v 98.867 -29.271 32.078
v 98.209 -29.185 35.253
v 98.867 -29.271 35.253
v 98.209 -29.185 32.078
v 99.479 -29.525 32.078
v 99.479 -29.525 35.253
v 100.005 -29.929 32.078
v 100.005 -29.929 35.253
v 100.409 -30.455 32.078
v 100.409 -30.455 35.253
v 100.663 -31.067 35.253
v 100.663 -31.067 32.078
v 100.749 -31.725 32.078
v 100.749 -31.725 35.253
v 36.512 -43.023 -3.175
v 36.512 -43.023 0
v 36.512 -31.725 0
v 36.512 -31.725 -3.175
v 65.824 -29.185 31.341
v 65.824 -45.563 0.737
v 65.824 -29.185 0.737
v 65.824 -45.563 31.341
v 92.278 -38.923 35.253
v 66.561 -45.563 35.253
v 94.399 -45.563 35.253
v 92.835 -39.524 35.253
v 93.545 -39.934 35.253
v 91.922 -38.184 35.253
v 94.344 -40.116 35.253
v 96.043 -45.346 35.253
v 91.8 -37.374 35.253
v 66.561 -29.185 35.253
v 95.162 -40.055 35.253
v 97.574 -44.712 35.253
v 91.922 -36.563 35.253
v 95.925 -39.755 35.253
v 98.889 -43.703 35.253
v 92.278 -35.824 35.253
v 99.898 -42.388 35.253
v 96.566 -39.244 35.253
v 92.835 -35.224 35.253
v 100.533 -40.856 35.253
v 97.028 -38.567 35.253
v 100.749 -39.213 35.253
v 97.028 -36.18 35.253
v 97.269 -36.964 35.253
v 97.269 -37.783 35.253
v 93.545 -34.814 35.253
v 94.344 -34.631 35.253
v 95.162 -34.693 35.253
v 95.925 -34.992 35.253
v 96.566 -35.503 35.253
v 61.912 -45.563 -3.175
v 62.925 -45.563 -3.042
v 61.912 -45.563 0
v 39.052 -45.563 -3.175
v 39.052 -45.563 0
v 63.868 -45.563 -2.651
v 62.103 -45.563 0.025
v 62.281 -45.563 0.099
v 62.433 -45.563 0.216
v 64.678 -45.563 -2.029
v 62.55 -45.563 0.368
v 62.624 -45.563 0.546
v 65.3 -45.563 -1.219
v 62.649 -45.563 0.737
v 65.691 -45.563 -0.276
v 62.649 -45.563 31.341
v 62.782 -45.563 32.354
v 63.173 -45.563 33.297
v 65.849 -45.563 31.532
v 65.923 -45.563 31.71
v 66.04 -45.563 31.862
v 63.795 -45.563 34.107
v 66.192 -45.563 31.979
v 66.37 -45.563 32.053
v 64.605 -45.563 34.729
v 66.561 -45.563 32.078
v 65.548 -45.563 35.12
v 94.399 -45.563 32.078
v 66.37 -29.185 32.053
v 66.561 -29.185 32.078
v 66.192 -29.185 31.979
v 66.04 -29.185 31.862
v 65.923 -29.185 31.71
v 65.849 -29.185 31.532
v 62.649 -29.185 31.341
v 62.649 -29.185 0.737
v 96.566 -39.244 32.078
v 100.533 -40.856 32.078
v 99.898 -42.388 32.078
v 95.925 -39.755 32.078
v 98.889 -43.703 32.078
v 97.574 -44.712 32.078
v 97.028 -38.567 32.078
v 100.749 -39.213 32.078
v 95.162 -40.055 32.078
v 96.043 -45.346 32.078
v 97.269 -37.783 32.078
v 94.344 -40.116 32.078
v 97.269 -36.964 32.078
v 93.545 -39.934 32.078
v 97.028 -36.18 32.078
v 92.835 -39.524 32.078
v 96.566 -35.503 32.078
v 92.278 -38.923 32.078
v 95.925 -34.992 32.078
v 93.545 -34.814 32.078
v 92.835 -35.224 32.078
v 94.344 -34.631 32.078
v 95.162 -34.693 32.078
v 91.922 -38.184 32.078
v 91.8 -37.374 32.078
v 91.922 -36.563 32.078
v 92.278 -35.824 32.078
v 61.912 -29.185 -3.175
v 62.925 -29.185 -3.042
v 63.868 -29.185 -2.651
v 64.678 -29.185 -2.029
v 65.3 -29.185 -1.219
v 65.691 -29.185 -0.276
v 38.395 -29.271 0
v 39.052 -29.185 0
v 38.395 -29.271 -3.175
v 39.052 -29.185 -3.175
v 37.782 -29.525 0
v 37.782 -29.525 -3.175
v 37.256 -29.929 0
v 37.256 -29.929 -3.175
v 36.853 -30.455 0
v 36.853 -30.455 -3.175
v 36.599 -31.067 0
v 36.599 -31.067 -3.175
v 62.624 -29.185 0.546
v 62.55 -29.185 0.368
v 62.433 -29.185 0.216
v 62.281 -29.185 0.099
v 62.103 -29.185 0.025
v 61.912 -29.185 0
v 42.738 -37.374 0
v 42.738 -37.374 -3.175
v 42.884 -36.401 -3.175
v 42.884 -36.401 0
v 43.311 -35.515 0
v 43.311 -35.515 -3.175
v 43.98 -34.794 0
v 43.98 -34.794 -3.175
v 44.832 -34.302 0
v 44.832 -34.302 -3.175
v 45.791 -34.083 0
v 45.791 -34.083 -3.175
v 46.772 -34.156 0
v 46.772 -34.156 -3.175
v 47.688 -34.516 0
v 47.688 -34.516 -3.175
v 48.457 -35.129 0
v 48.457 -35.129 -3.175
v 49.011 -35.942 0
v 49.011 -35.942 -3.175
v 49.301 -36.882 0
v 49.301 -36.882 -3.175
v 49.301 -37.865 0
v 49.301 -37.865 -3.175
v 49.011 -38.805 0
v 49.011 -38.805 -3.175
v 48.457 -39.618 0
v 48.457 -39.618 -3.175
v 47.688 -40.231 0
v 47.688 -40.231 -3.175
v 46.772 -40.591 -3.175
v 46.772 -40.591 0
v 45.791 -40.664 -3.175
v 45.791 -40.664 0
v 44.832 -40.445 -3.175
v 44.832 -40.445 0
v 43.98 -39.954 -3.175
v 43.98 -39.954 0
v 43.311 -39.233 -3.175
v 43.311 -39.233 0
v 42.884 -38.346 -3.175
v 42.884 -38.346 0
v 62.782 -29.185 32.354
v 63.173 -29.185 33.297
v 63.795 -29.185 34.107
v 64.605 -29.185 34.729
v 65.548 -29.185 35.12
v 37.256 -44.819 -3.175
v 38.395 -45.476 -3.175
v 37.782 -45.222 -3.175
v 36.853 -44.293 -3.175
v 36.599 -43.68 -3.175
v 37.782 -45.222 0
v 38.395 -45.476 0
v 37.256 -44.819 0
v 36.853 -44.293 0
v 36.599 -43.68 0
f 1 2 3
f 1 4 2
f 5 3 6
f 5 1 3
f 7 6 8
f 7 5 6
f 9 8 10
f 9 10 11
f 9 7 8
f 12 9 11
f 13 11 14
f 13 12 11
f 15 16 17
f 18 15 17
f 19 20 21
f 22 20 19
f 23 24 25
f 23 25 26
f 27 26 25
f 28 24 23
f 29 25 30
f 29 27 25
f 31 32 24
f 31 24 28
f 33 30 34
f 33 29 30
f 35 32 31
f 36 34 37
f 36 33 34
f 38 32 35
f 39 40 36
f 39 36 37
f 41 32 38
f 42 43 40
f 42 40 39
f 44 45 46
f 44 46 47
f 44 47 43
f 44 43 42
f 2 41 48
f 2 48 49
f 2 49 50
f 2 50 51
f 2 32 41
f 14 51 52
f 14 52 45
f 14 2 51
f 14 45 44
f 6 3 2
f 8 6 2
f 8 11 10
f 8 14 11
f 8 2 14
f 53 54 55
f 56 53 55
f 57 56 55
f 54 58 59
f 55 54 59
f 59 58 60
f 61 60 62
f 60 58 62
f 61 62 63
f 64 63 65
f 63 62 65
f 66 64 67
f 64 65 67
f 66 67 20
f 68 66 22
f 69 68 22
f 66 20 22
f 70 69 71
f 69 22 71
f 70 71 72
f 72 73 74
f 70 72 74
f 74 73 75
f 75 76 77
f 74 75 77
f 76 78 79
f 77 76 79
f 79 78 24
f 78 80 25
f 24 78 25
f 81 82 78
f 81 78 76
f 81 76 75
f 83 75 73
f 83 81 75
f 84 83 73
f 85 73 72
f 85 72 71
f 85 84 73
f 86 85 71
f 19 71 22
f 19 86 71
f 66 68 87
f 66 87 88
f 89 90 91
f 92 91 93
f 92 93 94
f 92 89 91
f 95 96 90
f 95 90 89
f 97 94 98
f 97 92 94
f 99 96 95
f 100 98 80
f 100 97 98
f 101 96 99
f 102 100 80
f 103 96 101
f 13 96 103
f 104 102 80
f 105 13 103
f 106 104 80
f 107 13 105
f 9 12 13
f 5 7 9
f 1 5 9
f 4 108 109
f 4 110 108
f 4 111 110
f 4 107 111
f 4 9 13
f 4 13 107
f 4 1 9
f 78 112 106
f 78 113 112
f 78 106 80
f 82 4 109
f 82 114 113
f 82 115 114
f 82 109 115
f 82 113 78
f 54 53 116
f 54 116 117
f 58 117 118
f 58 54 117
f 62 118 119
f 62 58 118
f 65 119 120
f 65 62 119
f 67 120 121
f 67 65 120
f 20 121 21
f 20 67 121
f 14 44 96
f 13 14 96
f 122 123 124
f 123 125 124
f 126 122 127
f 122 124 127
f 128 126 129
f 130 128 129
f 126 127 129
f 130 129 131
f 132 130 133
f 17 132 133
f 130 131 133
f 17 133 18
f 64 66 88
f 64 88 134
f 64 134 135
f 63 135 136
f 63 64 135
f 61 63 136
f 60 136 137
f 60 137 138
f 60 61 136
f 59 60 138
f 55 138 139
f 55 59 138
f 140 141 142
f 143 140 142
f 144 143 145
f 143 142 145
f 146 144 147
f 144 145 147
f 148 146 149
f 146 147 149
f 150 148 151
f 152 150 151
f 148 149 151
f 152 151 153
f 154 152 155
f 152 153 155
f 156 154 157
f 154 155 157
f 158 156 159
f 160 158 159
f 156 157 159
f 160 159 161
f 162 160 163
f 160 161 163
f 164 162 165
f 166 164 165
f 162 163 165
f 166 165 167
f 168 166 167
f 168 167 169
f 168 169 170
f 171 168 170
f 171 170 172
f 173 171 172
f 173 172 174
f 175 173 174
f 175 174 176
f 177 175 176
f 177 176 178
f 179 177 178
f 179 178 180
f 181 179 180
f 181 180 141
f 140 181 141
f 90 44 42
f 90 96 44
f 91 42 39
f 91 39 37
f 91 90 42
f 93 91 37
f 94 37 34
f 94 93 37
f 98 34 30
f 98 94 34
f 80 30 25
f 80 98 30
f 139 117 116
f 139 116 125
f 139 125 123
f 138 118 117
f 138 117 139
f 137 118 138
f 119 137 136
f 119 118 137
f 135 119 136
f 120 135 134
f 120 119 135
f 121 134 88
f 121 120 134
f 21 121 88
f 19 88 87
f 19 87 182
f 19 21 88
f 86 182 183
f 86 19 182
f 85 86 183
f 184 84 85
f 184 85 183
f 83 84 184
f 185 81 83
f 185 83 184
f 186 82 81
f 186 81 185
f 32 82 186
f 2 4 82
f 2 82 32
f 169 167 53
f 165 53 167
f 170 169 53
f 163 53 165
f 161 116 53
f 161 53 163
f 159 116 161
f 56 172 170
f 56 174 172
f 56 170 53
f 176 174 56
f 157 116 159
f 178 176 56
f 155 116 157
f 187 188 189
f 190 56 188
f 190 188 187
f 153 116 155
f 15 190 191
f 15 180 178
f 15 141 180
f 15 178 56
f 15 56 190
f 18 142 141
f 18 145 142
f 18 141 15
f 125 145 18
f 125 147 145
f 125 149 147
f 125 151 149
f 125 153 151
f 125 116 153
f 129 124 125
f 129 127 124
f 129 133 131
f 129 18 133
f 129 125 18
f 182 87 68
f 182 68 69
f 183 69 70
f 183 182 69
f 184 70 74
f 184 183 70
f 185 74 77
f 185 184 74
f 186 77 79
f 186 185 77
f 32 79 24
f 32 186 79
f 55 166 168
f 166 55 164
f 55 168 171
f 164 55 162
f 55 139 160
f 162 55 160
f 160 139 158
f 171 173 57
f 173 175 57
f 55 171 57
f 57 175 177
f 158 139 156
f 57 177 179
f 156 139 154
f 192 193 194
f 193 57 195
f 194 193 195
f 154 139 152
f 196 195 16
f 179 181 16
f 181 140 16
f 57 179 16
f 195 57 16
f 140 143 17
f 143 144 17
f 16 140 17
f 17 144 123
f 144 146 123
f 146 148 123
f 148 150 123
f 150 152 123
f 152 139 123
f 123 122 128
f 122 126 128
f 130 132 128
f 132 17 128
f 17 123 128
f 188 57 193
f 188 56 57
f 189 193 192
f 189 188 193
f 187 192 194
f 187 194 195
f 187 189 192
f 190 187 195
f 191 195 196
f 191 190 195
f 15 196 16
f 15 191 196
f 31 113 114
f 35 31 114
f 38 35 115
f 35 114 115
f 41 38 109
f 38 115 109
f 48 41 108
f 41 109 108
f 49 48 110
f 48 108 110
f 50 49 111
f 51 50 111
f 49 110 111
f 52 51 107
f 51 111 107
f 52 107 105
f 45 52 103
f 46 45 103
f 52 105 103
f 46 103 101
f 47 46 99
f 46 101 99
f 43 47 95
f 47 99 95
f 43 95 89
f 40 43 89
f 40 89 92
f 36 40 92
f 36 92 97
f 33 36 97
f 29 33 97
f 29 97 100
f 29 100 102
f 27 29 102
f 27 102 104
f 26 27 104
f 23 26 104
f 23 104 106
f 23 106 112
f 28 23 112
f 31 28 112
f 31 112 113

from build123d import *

# Parameters (mm, degrees)
BASE_FLANGE1_DEPTH           = 3.175
M6_CLEARANCE_HOLE1_D         = 6.6
EDGE_FLANGE1_DEPTH           = 16.378
EDGE_FLANGE2_STRIP_W         = 14.1732
EDGE_FLANGE2_STRIP_H         = 3.175
EDGE_FLANGE2_STRIP_CUT_DEPTH = 16.378
EDGE_FLANGE2_DEPTH           = 16.378
M5_CLEARANCE_HOLE1_D         = 5.5
FILLET1_R                    = 2.54
FILLET2_R                    = 6.35


# Sheet-metal steps are written as plain solids
with BuildPart() as part:
    # Sketch1 → Base-Flange1 (new body)
    with BuildSketch(Plane.XY):
        Polygon((52.8905, -45.562600001), (36.5125, -45.562600001), (36.5125, -29.184600001), (61.9125, -29.184600001), (61.9125, -45.562600001), align=None)
    extrude(amount=-BASE_FLANGE1_DEPTH)

    # M6 Clearance Hole1 (through all)
    with Locations(Plane.XY):
        with Locations((46.0375, -37.373600001)):
            Hole(M6_CLEARANCE_HOLE1_D / 2)

    # Edge-Flange1 section (across the edge) → Edge-Flange1 (add)
    with BuildSketch(Plane(origin=(62.6491, -45.562600001, 0), x_dir=(-1, 0, 0), z_dir=(0, 1, 0))):
        with BuildLine():
            Line((-3.175, 0.7366), (-3.175, 32.0779))
            Line((-3.175, 32.0779), (0, 32.0779))
            Line((0, 32.0779), (0, 0.7366))
            ThreePointArc((0, 0.7366), (0.215745145, 0.215745145), (0.7366, 0))
            Line((0.7366, 0), (0.7366, -3.175))
            ThreePointArc((0.7366, -3.175), (-2.029318885, -2.029318885), (-3.175, 0.7366))
        make_face()
    extrude(amount=EDGE_FLANGE1_DEPTH)

    # Edge-Flange2 strip (across the edge) → Edge-Flange2 strip cut (cut)
    with BuildSketch(Plane(origin=(65.8241, -29.184600001, 32.0779), x_dir=(0, 0, -1), z_dir=(0, -1, 0))):
        with Locations((-6.35, -1.5875)):
            Rectangle(EDGE_FLANGE2_STRIP_W, EDGE_FLANGE2_STRIP_H)
    extrude(amount=EDGE_FLANGE2_STRIP_CUT_DEPTH, mode=Mode.SUBTRACT)

    # Edge-Flange2 section (across the edge) → Edge-Flange2 (add)
    with BuildSketch(Plane(origin=(65.8241, -29.184600001, 32.0779), x_dir=(0, 0, -1), z_dir=(0, -1, 0))):
        with BuildLine():
            Line((-3.175, 0.7366), (-3.175, 34.925))
            Line((-3.175, 34.925), (0, 34.925))
            Line((0, 34.925), (0, 0.7366))
            ThreePointArc((0, 0.7366), (0.215745145, 0.215745145), (0.7366, 0))
            Line((0.7366, 0), (0.7366, -3.175))
            ThreePointArc((0.7366, -3.175), (-2.029318885, -2.029318885), (-3.175, 0.7366))
        make_face()
    extrude(amount=EDGE_FLANGE2_DEPTH)

    # M5 Clearance Hole1 (through all)
    with Locations(Plane.XY.offset(35.2529)):
        with Locations((94.5499, -37.373600001)):
            Hole(M5_CLEARANCE_HOLE1_D / 2)

    # Fillet1
    fillet1_edges = [part.edges().sort_by_distance(p)[0] for p in [
        (100.7491, -29.184600001, 33.6654),
        (36.5125, -45.562600001, -1.5875),
        (36.5125, -29.184600001, -1.5875),
    ]]
    fillet(fillet1_edges, radius=FILLET1_R)

    # Fillet2
    fillet2_edges = [part.edges().sort_by_distance(p)[0] for p in [
        (100.7491, -45.562600001, 33.6654),
    ]]
    fillet(fillet2_edges, radius=FILLET2_R)


solid = part.part
